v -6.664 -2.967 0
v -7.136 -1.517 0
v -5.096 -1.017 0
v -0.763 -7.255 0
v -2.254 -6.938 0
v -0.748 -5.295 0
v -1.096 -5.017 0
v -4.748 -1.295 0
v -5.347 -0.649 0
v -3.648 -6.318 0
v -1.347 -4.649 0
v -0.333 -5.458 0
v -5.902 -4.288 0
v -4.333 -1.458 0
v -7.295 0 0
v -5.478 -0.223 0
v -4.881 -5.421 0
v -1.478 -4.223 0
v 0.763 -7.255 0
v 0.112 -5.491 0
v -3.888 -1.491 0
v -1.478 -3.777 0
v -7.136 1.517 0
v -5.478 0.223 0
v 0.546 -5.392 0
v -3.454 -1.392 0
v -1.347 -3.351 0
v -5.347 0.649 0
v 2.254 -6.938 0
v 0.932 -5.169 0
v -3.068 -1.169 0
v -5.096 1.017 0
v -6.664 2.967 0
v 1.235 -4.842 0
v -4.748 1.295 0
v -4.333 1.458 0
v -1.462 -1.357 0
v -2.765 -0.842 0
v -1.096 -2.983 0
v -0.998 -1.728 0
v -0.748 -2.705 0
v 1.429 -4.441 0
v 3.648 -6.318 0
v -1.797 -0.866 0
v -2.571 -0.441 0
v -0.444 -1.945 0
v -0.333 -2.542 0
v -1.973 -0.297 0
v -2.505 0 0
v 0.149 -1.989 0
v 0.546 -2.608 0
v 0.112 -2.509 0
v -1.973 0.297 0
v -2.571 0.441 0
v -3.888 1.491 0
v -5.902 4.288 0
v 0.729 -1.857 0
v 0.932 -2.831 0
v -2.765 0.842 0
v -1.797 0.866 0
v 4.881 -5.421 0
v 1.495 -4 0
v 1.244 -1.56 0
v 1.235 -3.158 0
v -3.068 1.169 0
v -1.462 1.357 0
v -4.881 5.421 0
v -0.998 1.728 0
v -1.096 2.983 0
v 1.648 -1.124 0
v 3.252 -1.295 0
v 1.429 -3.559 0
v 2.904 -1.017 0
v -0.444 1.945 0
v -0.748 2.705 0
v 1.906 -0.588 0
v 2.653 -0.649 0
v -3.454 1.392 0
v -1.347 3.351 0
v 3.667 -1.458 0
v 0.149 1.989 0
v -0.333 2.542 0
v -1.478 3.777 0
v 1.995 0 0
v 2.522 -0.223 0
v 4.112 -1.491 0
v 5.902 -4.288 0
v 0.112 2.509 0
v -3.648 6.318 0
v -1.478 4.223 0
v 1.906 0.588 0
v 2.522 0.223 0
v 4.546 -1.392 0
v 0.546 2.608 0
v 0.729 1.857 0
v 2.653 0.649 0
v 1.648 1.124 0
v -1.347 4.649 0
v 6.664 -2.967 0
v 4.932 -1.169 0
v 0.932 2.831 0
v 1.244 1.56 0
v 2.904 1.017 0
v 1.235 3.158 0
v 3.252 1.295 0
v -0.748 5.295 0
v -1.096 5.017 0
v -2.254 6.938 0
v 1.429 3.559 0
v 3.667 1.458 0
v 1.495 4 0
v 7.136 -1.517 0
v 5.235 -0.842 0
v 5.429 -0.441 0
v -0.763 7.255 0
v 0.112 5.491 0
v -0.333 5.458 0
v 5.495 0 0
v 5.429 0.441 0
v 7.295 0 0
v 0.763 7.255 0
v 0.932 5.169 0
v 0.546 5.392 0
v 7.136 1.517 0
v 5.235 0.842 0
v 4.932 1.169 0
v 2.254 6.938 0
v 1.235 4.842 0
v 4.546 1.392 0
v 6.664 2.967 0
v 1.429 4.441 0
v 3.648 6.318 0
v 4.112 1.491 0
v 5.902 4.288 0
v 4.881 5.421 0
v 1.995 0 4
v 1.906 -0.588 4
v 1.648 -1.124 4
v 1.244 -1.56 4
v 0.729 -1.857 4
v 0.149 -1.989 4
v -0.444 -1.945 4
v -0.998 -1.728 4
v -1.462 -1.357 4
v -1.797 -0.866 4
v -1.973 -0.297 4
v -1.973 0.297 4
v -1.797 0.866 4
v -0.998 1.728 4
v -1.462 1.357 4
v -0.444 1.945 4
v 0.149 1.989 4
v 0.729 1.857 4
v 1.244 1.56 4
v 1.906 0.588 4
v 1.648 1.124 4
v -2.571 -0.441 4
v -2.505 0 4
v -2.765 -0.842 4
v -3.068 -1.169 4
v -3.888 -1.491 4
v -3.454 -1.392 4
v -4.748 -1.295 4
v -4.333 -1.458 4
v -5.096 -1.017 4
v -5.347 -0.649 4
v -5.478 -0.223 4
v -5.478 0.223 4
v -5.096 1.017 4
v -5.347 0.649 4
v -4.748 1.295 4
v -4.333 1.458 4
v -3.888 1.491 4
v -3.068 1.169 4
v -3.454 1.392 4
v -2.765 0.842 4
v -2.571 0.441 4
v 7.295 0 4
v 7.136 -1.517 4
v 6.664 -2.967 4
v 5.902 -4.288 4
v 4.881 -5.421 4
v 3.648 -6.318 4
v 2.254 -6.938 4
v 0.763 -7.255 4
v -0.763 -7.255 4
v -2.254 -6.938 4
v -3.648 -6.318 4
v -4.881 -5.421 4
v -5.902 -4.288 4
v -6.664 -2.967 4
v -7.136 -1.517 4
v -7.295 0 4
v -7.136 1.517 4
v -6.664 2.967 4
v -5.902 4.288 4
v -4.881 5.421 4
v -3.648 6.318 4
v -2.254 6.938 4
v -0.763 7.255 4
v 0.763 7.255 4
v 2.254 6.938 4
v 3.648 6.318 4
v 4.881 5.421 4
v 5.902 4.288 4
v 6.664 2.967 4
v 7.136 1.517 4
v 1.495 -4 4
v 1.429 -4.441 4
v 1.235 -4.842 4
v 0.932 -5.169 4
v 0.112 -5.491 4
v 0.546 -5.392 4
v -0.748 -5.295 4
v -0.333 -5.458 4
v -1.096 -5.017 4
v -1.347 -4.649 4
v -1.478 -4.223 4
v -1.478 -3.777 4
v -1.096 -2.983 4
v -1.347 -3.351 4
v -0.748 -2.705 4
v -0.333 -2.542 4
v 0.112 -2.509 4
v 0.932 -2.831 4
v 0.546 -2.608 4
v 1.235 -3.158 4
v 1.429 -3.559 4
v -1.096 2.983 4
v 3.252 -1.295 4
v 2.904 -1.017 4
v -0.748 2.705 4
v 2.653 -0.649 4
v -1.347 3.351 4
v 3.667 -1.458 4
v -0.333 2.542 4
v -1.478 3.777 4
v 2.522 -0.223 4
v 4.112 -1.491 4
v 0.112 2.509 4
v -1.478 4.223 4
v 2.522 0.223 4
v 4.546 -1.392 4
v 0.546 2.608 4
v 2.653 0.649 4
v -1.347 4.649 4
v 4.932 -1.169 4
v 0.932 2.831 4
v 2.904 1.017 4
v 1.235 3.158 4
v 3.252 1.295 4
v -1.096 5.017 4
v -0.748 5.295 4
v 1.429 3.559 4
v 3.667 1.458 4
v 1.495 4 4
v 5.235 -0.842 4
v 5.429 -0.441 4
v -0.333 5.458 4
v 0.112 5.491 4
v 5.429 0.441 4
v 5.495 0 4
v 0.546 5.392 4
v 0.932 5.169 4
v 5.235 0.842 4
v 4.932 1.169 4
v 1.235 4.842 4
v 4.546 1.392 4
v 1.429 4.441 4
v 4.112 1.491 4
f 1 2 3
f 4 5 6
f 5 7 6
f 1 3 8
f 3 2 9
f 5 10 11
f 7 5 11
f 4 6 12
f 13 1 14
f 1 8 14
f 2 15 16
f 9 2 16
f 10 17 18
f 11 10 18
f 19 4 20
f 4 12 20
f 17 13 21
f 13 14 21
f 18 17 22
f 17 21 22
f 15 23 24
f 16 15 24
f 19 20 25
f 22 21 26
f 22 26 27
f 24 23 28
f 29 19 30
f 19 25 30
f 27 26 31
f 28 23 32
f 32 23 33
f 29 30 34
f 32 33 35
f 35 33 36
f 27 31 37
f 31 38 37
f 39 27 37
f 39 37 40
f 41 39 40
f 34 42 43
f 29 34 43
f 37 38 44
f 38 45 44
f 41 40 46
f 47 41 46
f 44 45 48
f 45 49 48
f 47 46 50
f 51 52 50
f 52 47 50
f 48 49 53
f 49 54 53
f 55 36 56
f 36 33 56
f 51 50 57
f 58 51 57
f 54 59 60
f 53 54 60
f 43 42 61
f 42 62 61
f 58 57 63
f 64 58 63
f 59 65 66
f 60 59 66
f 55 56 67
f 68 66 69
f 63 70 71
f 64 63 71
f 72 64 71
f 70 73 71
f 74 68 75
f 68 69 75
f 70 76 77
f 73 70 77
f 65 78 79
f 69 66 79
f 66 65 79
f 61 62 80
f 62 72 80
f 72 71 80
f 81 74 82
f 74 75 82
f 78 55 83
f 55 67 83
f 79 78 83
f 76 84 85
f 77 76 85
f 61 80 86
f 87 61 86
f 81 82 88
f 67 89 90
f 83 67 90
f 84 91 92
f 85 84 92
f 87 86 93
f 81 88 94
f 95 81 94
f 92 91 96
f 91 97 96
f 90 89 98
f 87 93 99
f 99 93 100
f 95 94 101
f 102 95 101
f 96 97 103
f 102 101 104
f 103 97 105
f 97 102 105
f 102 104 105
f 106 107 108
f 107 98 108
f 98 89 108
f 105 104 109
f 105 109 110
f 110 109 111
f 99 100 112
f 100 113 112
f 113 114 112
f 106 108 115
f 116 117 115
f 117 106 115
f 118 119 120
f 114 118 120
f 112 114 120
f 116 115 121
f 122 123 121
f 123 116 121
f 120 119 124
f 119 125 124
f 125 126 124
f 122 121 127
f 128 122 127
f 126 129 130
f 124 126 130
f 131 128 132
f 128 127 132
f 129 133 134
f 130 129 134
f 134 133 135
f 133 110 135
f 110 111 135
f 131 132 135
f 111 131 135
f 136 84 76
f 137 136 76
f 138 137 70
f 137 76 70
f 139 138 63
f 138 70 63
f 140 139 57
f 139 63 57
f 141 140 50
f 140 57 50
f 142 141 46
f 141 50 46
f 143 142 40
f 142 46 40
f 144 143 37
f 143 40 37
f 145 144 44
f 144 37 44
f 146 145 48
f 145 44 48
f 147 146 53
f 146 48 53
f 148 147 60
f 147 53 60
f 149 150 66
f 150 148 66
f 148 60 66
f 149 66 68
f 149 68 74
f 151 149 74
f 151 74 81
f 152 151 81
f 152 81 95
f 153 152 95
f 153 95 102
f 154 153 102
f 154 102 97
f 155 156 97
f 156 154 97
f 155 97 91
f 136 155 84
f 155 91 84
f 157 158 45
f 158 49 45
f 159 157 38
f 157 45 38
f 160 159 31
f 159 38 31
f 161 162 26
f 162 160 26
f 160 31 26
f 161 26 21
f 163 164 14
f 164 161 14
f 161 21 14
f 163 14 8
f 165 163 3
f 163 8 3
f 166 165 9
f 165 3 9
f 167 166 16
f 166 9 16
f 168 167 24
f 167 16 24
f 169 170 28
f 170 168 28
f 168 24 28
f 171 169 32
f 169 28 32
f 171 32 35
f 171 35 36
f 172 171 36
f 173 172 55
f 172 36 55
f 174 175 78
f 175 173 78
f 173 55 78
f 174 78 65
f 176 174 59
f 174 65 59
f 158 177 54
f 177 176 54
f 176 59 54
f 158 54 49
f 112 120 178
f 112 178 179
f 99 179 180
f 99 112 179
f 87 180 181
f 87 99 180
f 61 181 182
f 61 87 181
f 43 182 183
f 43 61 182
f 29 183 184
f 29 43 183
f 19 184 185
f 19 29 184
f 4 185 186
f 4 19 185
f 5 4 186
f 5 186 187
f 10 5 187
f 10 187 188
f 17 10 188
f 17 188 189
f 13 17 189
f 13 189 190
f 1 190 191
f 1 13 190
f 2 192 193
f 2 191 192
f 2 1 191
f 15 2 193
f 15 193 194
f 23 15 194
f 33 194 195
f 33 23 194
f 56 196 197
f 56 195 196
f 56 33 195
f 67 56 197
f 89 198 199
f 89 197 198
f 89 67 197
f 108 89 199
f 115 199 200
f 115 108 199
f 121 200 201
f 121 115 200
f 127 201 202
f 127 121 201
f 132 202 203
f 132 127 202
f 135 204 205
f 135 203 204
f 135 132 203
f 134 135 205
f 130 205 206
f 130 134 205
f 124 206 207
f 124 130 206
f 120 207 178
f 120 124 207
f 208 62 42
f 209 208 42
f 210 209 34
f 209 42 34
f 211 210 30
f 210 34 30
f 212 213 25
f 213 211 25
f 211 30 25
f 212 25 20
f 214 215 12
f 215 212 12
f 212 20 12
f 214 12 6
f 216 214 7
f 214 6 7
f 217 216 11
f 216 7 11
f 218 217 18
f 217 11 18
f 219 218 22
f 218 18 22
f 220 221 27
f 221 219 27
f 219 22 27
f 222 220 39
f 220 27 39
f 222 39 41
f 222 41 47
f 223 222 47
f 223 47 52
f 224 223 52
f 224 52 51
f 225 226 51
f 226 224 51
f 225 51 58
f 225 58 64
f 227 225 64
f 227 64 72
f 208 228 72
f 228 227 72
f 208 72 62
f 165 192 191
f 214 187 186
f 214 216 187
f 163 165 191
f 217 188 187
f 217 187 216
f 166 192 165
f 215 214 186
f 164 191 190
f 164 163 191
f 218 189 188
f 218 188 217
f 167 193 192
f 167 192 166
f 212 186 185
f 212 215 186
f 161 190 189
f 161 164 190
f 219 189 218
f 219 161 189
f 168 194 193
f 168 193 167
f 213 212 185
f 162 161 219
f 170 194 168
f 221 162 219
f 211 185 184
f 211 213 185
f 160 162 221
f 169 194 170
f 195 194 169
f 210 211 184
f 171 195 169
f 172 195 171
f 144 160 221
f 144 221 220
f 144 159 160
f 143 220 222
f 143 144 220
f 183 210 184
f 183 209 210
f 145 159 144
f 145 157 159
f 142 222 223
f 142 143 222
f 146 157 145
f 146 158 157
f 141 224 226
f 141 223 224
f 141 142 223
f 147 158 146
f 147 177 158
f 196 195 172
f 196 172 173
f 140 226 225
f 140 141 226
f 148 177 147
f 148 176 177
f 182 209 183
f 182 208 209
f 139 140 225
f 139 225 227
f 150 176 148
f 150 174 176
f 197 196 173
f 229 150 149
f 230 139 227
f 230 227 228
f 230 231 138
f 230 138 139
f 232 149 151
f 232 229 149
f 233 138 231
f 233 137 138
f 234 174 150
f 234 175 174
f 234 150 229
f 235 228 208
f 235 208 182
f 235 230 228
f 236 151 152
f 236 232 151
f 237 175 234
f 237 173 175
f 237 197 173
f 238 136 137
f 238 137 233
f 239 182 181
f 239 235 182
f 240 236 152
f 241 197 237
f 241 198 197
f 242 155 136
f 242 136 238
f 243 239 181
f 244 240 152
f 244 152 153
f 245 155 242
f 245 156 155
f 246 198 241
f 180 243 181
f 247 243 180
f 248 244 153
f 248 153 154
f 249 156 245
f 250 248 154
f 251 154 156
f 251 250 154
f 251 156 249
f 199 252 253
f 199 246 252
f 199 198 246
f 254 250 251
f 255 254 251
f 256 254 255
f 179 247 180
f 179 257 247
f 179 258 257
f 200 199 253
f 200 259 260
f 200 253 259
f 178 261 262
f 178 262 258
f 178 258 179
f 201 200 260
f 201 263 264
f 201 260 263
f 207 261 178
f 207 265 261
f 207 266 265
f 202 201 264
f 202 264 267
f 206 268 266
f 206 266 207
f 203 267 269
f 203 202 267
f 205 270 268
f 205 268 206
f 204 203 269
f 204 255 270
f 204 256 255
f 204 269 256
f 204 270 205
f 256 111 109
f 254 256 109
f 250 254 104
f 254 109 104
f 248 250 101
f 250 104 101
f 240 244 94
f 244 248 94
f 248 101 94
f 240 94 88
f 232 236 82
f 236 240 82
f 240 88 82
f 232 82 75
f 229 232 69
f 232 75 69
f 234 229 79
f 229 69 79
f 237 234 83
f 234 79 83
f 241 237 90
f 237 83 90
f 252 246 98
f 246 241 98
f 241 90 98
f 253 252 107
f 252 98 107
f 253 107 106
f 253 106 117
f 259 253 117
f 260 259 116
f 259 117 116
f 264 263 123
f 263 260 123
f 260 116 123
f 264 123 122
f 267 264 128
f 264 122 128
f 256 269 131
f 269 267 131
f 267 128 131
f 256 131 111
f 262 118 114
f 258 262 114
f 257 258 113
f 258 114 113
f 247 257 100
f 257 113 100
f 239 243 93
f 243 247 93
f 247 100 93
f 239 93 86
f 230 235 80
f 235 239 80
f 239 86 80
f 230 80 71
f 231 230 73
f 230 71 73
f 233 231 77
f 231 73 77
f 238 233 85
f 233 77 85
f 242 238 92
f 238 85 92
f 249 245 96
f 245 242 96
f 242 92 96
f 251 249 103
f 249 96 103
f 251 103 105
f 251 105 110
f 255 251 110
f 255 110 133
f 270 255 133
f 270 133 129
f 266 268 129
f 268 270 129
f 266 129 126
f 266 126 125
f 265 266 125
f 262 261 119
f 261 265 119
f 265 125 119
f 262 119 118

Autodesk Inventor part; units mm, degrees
ref_plane "YZ Plane" through (0, 0, 0) normal (1, 0, 0) x (0, 1, 0)
ref_plane "XZ Plane" through (0, 0, 0) normal (0, 1, 0) x (-1, 0, 0)
ref_plane "XY Plane" through (0, 0, 0) normal (0, 0, 1) x (1, 0, 0)
sketch "スケッチ1" plane through (0, 0, 0) normal (0, 0, 1) x (1, 0, 0)
  line L0 (0, 0) -> (-4, 0) construction
  circle A0 centre (-4, 0) radius 1.495
  line L1 (0, 0) -> (0, -4) construction
  circle A1 centre (0, -4) radius 1.495
  line L2 (0, 0) -> (4, 0) construction
  circle A2 centre (4, 0) radius 1.495
  line L3 (0, 0) -> (0, 4) construction
  circle A3 centre (0, 4) radius 1.495
  line L4 (0, 0) -> (-8.8388, 8.8388) construction
  circle A4 centre (-8.8388, 8.8388) radius 1.5
  line L5 (0, 0) -> (-8.8388, -8.8388) construction
  circle A5 centre (-8.8388, -8.8388) radius 1.5
  line L6 (0, 0) -> (8.8388, -8.8388) construction
  circle A6 centre (8.8388, -8.8388) radius 1.5
  line L7 (0, 0) -> (8.8388, 8.8388) construction
  circle A7 centre (8.8388, 8.8388) radius 1.5
  circle A8 centre (0, 0) radius 7.295
  circle A9 centre (0, 0) radius 15.5
  circle A10 centre (0, 0) radius 1.995
  dimension "d0" = 4
  dimension "d1" = 2.99
  dimension "d4" = 360
  dimension "d6" = 12.5
  dimension "d7" = 3
  dimension "d8" = 45
  dimension "d11" = 360
  dimension "d13" = 1.8
  dimension "d14" = 14.59
  dimension "d15" = 1.5
  dimension "d16" = 3.99
extrude "押し出し1" add sketch "スケッチ1" along normal blind 4 contours A8
properties part number "脚中間フレームカム" material "アルミニウム 7075"
